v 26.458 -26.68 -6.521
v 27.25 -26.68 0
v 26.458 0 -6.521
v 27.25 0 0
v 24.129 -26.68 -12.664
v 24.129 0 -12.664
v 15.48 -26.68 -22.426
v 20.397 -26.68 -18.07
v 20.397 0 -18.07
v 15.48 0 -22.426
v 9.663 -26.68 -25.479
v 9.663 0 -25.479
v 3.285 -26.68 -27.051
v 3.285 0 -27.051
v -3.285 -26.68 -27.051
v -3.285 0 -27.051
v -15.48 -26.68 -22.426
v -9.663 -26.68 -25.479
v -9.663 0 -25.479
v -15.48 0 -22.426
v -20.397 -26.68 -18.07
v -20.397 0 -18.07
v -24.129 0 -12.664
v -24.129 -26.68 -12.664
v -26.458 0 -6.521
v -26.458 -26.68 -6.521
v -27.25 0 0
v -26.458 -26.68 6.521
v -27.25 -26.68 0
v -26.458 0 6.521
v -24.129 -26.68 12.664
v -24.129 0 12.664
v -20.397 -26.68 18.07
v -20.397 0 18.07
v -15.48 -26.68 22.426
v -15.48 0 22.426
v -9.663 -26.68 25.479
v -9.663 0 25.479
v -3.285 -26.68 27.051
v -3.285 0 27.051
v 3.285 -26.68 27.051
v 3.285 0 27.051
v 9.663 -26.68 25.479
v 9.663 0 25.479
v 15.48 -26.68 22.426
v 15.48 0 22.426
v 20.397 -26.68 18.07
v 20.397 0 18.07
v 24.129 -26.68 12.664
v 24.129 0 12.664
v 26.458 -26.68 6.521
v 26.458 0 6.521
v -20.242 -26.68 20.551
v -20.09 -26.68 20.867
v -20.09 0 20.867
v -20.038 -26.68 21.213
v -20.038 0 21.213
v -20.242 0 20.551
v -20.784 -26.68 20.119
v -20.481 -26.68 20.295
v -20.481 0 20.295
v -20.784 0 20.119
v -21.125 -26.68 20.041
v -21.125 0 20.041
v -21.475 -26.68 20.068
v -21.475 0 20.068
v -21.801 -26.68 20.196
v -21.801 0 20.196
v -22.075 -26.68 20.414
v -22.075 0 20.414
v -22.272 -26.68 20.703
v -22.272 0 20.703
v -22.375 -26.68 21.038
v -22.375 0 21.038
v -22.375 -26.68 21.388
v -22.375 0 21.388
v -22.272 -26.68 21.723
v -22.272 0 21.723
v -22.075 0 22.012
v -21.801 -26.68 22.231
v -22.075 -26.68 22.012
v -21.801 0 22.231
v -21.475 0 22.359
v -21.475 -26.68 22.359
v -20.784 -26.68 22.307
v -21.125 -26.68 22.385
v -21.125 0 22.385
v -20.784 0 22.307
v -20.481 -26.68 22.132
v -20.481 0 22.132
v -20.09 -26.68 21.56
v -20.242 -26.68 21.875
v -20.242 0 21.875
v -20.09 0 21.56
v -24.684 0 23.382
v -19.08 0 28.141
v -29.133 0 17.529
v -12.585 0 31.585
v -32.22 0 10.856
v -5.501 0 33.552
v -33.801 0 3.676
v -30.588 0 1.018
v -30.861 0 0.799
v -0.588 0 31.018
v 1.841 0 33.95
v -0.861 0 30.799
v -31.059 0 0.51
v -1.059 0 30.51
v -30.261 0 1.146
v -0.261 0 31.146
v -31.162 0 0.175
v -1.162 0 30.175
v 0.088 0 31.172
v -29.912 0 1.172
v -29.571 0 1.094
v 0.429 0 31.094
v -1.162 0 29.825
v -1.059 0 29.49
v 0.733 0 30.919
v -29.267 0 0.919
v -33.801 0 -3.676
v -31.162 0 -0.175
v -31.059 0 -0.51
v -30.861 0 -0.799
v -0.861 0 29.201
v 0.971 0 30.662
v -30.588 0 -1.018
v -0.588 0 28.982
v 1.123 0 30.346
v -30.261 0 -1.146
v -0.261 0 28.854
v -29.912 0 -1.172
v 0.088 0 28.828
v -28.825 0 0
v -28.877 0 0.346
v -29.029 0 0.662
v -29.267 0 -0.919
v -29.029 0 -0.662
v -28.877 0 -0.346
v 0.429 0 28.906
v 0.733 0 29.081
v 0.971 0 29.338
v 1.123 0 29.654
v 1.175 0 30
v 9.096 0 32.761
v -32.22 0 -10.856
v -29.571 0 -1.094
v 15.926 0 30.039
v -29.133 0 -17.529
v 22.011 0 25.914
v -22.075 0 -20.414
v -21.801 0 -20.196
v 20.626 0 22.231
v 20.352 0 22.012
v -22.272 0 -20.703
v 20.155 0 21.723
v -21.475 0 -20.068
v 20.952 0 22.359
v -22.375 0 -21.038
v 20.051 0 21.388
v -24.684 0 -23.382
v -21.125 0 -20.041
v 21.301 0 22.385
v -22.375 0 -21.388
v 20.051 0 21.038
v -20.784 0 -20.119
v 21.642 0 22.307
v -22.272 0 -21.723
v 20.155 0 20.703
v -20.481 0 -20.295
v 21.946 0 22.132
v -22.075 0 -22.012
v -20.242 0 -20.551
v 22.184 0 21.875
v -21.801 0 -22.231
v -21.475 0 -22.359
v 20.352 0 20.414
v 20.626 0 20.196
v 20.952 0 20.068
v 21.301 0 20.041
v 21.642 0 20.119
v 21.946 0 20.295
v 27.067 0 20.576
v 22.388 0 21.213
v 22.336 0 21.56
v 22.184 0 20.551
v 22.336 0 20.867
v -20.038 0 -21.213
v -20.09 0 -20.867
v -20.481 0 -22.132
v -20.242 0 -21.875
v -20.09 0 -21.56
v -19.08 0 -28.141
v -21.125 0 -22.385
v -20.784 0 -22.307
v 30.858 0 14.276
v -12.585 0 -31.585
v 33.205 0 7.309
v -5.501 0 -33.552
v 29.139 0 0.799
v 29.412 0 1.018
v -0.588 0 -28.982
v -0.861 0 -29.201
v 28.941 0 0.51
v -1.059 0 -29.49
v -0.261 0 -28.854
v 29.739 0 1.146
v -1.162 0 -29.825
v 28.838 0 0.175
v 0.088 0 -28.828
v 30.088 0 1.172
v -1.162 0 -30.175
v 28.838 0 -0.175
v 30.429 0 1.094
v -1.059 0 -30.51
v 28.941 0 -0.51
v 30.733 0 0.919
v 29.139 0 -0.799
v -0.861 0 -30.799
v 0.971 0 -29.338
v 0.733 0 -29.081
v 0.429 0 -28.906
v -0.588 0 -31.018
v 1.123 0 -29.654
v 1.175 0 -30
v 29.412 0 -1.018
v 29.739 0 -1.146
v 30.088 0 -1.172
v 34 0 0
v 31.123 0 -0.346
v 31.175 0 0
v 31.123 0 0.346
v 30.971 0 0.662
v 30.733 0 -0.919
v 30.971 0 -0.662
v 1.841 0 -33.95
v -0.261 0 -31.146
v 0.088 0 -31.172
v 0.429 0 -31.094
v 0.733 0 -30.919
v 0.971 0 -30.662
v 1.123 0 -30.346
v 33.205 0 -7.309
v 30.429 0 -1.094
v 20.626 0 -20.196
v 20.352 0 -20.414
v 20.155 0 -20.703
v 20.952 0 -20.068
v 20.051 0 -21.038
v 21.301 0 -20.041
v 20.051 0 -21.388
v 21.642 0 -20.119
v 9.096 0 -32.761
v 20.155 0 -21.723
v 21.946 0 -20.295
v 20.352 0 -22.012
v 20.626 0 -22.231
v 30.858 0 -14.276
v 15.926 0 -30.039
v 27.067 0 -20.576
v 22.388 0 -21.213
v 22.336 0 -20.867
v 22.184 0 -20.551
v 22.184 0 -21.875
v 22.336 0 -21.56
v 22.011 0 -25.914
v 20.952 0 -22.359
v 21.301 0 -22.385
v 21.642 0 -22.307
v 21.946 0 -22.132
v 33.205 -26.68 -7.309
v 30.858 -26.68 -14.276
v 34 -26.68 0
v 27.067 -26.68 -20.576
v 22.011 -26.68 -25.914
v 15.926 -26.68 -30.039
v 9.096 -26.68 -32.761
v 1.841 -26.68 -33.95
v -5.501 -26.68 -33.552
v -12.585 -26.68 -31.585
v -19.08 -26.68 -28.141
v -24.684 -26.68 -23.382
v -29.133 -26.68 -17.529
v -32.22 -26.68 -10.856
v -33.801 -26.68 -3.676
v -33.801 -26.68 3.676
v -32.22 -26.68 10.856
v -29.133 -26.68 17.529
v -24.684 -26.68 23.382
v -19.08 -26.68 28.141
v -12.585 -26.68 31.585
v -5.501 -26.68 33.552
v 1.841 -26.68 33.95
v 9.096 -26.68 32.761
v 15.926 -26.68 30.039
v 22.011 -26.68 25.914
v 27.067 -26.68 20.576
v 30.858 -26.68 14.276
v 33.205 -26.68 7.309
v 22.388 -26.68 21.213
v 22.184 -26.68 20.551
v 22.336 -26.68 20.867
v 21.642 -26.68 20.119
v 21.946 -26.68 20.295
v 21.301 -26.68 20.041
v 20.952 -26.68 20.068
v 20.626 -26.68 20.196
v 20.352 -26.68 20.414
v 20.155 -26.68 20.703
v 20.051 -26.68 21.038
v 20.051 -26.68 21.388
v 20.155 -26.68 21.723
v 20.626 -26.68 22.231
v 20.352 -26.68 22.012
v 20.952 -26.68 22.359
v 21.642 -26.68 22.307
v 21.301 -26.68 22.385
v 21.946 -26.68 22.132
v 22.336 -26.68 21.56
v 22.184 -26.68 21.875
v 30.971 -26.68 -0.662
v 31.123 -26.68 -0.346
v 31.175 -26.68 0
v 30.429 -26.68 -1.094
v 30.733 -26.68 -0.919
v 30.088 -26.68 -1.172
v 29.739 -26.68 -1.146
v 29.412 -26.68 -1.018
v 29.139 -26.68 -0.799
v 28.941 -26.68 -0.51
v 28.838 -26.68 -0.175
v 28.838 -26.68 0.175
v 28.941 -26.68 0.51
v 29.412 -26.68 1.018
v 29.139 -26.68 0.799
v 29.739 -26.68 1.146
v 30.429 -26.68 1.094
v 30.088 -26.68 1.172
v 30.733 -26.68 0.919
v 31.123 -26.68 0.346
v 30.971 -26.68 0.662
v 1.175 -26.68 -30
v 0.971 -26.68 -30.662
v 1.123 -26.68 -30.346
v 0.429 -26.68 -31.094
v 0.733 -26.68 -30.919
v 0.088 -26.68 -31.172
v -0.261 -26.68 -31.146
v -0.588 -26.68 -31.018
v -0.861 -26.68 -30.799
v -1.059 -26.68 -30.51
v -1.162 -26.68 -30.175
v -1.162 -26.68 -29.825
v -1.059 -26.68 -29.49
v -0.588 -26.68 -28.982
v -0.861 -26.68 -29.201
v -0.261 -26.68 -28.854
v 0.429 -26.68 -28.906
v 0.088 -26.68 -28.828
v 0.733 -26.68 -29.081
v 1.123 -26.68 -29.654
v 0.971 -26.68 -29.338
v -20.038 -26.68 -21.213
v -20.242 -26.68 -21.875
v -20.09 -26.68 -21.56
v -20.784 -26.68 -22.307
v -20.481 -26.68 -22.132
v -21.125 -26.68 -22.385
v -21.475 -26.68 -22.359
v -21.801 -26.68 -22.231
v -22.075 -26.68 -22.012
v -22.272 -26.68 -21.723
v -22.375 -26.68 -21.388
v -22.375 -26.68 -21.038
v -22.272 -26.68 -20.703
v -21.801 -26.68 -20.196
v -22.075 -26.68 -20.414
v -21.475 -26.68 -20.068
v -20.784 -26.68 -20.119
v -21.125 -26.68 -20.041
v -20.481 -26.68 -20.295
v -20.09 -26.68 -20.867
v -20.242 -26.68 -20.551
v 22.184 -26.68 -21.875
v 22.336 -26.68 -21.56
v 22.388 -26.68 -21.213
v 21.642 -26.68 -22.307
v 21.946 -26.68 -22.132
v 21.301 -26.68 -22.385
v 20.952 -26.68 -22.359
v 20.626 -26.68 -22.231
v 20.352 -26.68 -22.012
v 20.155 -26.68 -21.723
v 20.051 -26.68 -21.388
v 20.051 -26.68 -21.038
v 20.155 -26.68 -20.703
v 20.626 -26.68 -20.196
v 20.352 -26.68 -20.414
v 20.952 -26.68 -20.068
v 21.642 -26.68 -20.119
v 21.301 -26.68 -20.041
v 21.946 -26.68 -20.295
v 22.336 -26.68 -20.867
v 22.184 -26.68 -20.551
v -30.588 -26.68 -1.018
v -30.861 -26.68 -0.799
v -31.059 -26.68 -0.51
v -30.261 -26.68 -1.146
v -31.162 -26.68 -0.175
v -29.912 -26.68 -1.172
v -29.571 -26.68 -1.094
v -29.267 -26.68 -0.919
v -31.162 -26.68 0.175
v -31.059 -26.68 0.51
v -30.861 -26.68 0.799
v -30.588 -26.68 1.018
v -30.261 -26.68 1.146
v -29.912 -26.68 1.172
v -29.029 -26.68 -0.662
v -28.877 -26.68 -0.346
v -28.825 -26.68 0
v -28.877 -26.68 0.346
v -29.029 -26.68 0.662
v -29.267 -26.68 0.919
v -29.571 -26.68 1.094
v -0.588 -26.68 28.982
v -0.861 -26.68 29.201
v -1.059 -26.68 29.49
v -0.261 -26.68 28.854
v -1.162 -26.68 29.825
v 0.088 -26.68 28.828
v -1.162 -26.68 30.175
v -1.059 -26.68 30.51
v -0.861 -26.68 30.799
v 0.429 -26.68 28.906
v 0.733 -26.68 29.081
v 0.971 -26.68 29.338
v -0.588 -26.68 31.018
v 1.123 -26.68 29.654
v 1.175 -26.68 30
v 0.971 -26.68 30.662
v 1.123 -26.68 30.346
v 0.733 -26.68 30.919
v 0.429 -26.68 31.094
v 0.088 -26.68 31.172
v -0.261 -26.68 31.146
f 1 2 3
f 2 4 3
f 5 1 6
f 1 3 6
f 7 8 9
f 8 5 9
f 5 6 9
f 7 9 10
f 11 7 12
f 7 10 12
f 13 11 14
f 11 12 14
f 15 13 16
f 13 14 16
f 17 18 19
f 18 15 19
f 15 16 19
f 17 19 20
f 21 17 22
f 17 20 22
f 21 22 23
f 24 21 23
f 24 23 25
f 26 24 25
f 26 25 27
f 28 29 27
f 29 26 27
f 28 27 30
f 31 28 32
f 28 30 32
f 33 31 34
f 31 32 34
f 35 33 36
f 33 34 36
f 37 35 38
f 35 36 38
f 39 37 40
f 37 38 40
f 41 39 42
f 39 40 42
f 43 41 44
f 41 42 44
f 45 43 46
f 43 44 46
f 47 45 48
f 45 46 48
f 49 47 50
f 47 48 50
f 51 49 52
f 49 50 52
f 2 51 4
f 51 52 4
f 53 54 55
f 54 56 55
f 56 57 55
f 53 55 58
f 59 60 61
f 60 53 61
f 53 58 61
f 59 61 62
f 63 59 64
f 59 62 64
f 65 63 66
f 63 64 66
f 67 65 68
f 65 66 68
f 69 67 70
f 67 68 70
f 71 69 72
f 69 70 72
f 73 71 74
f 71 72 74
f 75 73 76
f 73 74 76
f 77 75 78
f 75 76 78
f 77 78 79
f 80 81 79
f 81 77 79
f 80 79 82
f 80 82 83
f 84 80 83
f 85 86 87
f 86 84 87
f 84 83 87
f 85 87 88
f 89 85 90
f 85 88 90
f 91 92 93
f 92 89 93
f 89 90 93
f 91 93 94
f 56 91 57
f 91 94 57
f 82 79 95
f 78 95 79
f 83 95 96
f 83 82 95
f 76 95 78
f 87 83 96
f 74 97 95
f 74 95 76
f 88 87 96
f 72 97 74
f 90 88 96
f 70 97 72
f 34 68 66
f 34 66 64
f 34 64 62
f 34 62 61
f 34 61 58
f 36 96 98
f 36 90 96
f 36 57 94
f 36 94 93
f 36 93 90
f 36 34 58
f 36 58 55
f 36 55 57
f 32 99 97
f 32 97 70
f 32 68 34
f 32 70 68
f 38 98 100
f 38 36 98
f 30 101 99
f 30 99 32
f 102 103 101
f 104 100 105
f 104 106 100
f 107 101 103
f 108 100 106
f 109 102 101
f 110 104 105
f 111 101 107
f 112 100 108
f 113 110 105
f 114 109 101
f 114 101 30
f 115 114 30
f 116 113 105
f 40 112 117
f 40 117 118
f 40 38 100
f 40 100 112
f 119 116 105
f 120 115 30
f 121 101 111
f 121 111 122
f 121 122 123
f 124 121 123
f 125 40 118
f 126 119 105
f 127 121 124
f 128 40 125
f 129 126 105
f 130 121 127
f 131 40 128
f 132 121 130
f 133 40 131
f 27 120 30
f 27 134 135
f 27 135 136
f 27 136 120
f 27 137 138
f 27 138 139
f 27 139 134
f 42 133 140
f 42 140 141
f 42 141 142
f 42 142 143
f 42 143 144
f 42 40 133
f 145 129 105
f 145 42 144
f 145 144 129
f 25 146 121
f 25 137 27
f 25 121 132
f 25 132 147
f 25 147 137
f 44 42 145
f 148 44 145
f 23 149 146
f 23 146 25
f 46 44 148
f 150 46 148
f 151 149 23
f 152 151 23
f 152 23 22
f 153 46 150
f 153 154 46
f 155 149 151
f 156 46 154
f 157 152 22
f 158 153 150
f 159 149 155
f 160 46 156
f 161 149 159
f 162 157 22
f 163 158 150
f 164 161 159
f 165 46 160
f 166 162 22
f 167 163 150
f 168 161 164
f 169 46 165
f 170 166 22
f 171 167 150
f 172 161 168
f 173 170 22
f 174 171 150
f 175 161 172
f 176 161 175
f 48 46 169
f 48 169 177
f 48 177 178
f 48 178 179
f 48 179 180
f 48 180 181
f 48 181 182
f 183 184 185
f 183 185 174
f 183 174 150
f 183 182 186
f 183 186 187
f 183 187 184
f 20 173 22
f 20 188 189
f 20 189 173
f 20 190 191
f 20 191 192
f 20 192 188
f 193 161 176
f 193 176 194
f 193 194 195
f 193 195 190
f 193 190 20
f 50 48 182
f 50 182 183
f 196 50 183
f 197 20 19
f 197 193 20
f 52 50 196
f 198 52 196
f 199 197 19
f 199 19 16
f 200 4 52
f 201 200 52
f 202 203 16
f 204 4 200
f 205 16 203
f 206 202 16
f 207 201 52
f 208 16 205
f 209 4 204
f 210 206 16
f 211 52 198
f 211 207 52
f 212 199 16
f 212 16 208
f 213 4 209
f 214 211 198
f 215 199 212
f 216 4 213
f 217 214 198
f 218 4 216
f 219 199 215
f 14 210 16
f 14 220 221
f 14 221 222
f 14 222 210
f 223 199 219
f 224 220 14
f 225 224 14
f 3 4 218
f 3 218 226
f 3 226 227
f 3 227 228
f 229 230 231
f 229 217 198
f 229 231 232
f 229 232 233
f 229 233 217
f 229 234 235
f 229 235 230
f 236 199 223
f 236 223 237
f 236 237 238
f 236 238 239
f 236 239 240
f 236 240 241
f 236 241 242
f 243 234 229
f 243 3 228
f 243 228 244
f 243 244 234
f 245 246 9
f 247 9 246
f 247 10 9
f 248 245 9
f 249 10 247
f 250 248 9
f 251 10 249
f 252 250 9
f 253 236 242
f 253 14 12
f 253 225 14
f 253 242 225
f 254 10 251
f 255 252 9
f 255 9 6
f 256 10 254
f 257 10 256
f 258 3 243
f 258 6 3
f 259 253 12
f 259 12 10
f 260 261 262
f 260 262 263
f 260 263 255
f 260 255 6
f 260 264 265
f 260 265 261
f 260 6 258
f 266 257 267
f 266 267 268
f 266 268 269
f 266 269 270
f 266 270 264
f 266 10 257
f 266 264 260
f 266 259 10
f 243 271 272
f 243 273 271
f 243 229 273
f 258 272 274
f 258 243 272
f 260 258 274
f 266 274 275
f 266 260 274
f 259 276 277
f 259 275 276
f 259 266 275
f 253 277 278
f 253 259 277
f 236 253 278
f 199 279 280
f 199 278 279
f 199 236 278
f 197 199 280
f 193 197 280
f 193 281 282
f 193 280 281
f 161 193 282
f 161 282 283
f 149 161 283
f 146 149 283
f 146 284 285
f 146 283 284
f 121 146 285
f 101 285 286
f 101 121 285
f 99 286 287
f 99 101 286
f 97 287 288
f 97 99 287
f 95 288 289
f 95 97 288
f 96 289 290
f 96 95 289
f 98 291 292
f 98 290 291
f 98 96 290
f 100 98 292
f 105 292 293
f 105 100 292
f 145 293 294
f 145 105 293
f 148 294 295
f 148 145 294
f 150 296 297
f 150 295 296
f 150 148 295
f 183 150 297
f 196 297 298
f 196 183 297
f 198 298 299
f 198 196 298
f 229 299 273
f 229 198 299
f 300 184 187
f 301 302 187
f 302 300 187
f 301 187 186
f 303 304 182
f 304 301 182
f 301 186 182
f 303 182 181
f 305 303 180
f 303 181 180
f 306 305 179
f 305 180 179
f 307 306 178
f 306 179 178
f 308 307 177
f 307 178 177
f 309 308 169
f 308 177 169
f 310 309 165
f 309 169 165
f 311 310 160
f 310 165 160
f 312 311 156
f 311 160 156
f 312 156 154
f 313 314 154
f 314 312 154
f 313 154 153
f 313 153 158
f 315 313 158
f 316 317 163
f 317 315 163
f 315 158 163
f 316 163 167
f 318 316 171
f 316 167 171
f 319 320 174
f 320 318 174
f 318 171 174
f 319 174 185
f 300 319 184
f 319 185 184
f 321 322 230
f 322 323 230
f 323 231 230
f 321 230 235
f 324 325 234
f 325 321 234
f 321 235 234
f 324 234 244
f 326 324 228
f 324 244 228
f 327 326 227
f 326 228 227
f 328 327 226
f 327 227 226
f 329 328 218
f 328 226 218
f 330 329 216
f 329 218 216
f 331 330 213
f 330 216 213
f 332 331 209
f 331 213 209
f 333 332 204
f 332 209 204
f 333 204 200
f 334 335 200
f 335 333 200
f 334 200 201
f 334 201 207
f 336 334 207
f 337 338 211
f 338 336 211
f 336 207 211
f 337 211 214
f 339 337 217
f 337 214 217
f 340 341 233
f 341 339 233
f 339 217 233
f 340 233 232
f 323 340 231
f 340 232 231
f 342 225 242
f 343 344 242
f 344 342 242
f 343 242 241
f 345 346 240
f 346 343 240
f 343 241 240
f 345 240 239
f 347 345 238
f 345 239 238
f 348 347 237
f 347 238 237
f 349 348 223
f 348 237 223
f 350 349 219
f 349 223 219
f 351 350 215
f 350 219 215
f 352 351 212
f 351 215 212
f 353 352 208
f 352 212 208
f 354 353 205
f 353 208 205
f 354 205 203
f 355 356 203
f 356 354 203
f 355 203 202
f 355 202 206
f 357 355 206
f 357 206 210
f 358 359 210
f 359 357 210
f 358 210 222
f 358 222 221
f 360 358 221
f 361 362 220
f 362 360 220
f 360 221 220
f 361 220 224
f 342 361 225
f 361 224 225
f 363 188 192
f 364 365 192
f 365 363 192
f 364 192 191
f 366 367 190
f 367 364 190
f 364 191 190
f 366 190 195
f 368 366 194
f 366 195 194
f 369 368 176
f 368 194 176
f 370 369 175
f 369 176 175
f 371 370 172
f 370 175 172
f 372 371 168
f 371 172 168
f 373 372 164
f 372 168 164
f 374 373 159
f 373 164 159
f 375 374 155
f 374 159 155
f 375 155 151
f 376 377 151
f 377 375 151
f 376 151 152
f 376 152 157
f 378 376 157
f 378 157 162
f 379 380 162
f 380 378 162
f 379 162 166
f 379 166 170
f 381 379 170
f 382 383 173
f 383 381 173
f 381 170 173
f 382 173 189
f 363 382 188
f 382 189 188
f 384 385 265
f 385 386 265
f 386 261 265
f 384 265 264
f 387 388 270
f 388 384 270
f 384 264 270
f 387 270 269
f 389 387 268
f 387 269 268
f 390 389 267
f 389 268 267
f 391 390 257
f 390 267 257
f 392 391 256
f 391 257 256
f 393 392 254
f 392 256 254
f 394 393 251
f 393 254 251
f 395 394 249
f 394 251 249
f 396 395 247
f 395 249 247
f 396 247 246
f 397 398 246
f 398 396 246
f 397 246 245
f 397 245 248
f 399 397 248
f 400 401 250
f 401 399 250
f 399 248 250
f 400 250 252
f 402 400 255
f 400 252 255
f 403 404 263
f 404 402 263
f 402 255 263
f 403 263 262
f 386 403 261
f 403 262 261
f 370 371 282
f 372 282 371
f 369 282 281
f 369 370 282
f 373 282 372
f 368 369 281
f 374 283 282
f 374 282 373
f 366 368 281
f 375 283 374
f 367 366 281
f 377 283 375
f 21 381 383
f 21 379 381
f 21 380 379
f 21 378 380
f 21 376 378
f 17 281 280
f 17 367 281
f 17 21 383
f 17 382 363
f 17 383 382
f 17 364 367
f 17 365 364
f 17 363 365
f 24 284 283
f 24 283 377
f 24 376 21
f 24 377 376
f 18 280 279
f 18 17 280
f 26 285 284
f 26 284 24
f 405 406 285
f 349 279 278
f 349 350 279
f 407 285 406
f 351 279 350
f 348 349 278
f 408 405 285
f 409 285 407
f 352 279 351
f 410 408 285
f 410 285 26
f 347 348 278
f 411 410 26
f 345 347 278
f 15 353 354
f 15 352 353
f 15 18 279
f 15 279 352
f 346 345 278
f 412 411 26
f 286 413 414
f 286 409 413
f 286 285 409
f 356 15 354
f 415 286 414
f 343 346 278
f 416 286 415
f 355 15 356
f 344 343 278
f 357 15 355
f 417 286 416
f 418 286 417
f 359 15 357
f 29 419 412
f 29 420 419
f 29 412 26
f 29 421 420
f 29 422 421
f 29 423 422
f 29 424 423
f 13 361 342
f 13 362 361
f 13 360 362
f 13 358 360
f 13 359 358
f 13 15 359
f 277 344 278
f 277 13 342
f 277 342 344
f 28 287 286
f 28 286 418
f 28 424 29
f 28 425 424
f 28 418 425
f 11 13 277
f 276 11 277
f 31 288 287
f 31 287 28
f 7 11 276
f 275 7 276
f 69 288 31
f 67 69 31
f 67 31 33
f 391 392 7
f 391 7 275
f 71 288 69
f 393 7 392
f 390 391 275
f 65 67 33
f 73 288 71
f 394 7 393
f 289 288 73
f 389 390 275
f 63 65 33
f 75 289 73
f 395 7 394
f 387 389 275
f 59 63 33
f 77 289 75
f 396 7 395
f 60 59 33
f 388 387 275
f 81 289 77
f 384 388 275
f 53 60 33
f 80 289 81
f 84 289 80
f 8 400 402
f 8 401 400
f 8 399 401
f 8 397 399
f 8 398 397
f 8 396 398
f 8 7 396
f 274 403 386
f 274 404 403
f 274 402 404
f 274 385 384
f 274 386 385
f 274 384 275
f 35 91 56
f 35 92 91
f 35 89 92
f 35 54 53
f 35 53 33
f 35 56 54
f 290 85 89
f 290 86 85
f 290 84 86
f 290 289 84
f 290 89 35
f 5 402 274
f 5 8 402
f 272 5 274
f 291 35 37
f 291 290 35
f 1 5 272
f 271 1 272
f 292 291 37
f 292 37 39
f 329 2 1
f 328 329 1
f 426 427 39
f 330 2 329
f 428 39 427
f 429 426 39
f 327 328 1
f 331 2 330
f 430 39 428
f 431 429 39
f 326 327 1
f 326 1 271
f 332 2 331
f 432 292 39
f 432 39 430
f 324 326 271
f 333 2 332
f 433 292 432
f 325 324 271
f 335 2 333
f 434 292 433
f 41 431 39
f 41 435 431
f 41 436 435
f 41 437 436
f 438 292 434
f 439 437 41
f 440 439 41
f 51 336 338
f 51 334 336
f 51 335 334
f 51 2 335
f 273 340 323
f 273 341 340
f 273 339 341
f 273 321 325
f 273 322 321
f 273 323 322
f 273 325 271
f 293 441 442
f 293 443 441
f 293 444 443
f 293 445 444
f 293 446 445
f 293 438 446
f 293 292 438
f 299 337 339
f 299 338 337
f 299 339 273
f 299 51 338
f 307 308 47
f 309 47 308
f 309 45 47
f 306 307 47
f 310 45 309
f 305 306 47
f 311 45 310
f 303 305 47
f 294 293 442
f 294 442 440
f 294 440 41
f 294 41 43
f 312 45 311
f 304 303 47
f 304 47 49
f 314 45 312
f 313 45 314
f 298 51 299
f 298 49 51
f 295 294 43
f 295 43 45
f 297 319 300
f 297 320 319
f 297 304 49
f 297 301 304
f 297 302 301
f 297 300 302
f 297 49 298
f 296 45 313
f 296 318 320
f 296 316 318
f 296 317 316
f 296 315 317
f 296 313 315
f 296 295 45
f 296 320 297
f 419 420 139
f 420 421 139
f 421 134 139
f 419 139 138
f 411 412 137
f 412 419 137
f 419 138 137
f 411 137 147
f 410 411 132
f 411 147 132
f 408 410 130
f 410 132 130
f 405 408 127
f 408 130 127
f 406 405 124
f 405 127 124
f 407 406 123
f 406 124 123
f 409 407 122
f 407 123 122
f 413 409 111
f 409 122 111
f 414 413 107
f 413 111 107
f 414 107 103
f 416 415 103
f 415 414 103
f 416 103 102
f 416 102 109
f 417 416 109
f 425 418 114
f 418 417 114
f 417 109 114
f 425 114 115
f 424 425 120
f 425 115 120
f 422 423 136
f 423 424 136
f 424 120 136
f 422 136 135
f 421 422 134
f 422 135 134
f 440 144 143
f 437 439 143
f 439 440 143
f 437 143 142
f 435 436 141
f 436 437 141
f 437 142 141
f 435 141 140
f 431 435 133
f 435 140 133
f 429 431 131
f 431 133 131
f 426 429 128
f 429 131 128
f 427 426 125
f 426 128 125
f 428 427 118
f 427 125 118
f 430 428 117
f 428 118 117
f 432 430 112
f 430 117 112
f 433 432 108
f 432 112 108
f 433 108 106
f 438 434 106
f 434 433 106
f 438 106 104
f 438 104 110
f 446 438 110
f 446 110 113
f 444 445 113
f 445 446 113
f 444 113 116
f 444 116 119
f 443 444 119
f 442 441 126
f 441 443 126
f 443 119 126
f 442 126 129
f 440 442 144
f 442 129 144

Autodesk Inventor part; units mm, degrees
ref_plane "YZ Plane" through (0, 0, 0) normal (1, 0, 0) x (0, 1, 0)
ref_plane "XZ Plane" through (0, 0, 0) normal (0, 1, 0) x (-1, 0, 0)
ref_plane "XY Plane" through (0, 0, 0) normal (0, 0, 1) x (1, 0, 0)
sketch "Sketch1" plane through (0, 0, 0) normal (0, 1, 0) x (-1, 0, 0)
  circle A0 centre (0, 0) radius 34
  circle A1 centre (9.5, 0) radius 1.6
  circle A2 centre (4.75, 8.2272) radius 1.6
  circle A3 centre (-4.75, 8.2272) radius 1.6
  circle A4 centre (-9.5, 0) radius 1.6
  circle A5 centre (-4.75, -8.2272) radius 1.6
  circle A6 centre (4.75, -8.2272) radius 1.6
  circle A7 centre (30, 0) radius 1.175
  circle A8 centre (21.2132, 21.2132) radius 1.175
  circle A9 centre (0, 30) radius 1.175
  circle A10 centre (-21.2132, 21.2132) radius 1.175
  circle A11 centre (-30, 0) radius 1.175
  circle A12 centre (-21.2132, -21.2132) radius 1.175
  circle A13 centre (0, -30) radius 1.175
  circle A14 centre (21.2132, -21.2132) radius 1.175
  dimension "d0" = 68
  dimension "d1" = 3.2
  dimension "d2" = 9.5
  dimension "d3" = 0
  dimension "d6" = 360
  dimension "d10" = 2.35
  dimension "d11" = 0
  dimension "d12" = 30
  dimension "d15" = 360
extrude "Extrusion3" add sketch "Sketch1" along normal blind 5
sketch "Sketch5" plane through (0, 0, 0) normal (0, -1, 0) x (1, 0, 0)
  circle A0 centre (0, 0) radius 34 projected
  circle A1 centre (21.2132, 21.2132) radius 1.175 projected
  circle A2 centre (30, 0) radius 1.175 projected
  circle A3 centre (21.2132, -21.2132) radius 1.175 projected
  circle A4 centre (0, -30) radius 1.175 projected
  circle A5 centre (-21.2132, -21.2132) radius 1.175 projected
  circle A6 centre (-30, 0) radius 1.175 projected
  circle A7 centre (-21.2132, 21.2132) radius 1.175 projected
  circle A8 centre (0, 30) radius 1.175 projected
  circle A9 centre (0, 0) radius 27.25
  circle A10 centre (21.2132, 21.2132) radius 1.175
  circle A11 centre (30, 0) radius 1.175
  circle A12 centre (21.2132, -21.2132) radius 1.175
  circle A13 centre (0, -30) radius 1.175
  circle A14 centre (-21.2132, -21.2132) radius 1.175
  circle A15 centre (-30, 0) radius 1.175
  circle A16 centre (-21.2132, 21.2132) radius 1.175
  circle A17 centre (0, 30) radius 1.175 projected
  circle A18 centre (0, 30) radius 1.225
  circle A19 centre (0, 0) radius 34
  dimension "d21" = 54.5
extrude "Extrusion4" add sketch "Sketch5" along normal blind 26.68 contours A0 | A18
sketch "Sketch6" plane through (0, 5, 0) normal (0, 1, 0) x (1, 0, 0)
  circle A0 centre (0, 0) radius 34
extrude "Extrusion5" cut sketch "Sketch6" against normal blind 5
properties part number "sprocketsHolder" material "ABS Plastic"
